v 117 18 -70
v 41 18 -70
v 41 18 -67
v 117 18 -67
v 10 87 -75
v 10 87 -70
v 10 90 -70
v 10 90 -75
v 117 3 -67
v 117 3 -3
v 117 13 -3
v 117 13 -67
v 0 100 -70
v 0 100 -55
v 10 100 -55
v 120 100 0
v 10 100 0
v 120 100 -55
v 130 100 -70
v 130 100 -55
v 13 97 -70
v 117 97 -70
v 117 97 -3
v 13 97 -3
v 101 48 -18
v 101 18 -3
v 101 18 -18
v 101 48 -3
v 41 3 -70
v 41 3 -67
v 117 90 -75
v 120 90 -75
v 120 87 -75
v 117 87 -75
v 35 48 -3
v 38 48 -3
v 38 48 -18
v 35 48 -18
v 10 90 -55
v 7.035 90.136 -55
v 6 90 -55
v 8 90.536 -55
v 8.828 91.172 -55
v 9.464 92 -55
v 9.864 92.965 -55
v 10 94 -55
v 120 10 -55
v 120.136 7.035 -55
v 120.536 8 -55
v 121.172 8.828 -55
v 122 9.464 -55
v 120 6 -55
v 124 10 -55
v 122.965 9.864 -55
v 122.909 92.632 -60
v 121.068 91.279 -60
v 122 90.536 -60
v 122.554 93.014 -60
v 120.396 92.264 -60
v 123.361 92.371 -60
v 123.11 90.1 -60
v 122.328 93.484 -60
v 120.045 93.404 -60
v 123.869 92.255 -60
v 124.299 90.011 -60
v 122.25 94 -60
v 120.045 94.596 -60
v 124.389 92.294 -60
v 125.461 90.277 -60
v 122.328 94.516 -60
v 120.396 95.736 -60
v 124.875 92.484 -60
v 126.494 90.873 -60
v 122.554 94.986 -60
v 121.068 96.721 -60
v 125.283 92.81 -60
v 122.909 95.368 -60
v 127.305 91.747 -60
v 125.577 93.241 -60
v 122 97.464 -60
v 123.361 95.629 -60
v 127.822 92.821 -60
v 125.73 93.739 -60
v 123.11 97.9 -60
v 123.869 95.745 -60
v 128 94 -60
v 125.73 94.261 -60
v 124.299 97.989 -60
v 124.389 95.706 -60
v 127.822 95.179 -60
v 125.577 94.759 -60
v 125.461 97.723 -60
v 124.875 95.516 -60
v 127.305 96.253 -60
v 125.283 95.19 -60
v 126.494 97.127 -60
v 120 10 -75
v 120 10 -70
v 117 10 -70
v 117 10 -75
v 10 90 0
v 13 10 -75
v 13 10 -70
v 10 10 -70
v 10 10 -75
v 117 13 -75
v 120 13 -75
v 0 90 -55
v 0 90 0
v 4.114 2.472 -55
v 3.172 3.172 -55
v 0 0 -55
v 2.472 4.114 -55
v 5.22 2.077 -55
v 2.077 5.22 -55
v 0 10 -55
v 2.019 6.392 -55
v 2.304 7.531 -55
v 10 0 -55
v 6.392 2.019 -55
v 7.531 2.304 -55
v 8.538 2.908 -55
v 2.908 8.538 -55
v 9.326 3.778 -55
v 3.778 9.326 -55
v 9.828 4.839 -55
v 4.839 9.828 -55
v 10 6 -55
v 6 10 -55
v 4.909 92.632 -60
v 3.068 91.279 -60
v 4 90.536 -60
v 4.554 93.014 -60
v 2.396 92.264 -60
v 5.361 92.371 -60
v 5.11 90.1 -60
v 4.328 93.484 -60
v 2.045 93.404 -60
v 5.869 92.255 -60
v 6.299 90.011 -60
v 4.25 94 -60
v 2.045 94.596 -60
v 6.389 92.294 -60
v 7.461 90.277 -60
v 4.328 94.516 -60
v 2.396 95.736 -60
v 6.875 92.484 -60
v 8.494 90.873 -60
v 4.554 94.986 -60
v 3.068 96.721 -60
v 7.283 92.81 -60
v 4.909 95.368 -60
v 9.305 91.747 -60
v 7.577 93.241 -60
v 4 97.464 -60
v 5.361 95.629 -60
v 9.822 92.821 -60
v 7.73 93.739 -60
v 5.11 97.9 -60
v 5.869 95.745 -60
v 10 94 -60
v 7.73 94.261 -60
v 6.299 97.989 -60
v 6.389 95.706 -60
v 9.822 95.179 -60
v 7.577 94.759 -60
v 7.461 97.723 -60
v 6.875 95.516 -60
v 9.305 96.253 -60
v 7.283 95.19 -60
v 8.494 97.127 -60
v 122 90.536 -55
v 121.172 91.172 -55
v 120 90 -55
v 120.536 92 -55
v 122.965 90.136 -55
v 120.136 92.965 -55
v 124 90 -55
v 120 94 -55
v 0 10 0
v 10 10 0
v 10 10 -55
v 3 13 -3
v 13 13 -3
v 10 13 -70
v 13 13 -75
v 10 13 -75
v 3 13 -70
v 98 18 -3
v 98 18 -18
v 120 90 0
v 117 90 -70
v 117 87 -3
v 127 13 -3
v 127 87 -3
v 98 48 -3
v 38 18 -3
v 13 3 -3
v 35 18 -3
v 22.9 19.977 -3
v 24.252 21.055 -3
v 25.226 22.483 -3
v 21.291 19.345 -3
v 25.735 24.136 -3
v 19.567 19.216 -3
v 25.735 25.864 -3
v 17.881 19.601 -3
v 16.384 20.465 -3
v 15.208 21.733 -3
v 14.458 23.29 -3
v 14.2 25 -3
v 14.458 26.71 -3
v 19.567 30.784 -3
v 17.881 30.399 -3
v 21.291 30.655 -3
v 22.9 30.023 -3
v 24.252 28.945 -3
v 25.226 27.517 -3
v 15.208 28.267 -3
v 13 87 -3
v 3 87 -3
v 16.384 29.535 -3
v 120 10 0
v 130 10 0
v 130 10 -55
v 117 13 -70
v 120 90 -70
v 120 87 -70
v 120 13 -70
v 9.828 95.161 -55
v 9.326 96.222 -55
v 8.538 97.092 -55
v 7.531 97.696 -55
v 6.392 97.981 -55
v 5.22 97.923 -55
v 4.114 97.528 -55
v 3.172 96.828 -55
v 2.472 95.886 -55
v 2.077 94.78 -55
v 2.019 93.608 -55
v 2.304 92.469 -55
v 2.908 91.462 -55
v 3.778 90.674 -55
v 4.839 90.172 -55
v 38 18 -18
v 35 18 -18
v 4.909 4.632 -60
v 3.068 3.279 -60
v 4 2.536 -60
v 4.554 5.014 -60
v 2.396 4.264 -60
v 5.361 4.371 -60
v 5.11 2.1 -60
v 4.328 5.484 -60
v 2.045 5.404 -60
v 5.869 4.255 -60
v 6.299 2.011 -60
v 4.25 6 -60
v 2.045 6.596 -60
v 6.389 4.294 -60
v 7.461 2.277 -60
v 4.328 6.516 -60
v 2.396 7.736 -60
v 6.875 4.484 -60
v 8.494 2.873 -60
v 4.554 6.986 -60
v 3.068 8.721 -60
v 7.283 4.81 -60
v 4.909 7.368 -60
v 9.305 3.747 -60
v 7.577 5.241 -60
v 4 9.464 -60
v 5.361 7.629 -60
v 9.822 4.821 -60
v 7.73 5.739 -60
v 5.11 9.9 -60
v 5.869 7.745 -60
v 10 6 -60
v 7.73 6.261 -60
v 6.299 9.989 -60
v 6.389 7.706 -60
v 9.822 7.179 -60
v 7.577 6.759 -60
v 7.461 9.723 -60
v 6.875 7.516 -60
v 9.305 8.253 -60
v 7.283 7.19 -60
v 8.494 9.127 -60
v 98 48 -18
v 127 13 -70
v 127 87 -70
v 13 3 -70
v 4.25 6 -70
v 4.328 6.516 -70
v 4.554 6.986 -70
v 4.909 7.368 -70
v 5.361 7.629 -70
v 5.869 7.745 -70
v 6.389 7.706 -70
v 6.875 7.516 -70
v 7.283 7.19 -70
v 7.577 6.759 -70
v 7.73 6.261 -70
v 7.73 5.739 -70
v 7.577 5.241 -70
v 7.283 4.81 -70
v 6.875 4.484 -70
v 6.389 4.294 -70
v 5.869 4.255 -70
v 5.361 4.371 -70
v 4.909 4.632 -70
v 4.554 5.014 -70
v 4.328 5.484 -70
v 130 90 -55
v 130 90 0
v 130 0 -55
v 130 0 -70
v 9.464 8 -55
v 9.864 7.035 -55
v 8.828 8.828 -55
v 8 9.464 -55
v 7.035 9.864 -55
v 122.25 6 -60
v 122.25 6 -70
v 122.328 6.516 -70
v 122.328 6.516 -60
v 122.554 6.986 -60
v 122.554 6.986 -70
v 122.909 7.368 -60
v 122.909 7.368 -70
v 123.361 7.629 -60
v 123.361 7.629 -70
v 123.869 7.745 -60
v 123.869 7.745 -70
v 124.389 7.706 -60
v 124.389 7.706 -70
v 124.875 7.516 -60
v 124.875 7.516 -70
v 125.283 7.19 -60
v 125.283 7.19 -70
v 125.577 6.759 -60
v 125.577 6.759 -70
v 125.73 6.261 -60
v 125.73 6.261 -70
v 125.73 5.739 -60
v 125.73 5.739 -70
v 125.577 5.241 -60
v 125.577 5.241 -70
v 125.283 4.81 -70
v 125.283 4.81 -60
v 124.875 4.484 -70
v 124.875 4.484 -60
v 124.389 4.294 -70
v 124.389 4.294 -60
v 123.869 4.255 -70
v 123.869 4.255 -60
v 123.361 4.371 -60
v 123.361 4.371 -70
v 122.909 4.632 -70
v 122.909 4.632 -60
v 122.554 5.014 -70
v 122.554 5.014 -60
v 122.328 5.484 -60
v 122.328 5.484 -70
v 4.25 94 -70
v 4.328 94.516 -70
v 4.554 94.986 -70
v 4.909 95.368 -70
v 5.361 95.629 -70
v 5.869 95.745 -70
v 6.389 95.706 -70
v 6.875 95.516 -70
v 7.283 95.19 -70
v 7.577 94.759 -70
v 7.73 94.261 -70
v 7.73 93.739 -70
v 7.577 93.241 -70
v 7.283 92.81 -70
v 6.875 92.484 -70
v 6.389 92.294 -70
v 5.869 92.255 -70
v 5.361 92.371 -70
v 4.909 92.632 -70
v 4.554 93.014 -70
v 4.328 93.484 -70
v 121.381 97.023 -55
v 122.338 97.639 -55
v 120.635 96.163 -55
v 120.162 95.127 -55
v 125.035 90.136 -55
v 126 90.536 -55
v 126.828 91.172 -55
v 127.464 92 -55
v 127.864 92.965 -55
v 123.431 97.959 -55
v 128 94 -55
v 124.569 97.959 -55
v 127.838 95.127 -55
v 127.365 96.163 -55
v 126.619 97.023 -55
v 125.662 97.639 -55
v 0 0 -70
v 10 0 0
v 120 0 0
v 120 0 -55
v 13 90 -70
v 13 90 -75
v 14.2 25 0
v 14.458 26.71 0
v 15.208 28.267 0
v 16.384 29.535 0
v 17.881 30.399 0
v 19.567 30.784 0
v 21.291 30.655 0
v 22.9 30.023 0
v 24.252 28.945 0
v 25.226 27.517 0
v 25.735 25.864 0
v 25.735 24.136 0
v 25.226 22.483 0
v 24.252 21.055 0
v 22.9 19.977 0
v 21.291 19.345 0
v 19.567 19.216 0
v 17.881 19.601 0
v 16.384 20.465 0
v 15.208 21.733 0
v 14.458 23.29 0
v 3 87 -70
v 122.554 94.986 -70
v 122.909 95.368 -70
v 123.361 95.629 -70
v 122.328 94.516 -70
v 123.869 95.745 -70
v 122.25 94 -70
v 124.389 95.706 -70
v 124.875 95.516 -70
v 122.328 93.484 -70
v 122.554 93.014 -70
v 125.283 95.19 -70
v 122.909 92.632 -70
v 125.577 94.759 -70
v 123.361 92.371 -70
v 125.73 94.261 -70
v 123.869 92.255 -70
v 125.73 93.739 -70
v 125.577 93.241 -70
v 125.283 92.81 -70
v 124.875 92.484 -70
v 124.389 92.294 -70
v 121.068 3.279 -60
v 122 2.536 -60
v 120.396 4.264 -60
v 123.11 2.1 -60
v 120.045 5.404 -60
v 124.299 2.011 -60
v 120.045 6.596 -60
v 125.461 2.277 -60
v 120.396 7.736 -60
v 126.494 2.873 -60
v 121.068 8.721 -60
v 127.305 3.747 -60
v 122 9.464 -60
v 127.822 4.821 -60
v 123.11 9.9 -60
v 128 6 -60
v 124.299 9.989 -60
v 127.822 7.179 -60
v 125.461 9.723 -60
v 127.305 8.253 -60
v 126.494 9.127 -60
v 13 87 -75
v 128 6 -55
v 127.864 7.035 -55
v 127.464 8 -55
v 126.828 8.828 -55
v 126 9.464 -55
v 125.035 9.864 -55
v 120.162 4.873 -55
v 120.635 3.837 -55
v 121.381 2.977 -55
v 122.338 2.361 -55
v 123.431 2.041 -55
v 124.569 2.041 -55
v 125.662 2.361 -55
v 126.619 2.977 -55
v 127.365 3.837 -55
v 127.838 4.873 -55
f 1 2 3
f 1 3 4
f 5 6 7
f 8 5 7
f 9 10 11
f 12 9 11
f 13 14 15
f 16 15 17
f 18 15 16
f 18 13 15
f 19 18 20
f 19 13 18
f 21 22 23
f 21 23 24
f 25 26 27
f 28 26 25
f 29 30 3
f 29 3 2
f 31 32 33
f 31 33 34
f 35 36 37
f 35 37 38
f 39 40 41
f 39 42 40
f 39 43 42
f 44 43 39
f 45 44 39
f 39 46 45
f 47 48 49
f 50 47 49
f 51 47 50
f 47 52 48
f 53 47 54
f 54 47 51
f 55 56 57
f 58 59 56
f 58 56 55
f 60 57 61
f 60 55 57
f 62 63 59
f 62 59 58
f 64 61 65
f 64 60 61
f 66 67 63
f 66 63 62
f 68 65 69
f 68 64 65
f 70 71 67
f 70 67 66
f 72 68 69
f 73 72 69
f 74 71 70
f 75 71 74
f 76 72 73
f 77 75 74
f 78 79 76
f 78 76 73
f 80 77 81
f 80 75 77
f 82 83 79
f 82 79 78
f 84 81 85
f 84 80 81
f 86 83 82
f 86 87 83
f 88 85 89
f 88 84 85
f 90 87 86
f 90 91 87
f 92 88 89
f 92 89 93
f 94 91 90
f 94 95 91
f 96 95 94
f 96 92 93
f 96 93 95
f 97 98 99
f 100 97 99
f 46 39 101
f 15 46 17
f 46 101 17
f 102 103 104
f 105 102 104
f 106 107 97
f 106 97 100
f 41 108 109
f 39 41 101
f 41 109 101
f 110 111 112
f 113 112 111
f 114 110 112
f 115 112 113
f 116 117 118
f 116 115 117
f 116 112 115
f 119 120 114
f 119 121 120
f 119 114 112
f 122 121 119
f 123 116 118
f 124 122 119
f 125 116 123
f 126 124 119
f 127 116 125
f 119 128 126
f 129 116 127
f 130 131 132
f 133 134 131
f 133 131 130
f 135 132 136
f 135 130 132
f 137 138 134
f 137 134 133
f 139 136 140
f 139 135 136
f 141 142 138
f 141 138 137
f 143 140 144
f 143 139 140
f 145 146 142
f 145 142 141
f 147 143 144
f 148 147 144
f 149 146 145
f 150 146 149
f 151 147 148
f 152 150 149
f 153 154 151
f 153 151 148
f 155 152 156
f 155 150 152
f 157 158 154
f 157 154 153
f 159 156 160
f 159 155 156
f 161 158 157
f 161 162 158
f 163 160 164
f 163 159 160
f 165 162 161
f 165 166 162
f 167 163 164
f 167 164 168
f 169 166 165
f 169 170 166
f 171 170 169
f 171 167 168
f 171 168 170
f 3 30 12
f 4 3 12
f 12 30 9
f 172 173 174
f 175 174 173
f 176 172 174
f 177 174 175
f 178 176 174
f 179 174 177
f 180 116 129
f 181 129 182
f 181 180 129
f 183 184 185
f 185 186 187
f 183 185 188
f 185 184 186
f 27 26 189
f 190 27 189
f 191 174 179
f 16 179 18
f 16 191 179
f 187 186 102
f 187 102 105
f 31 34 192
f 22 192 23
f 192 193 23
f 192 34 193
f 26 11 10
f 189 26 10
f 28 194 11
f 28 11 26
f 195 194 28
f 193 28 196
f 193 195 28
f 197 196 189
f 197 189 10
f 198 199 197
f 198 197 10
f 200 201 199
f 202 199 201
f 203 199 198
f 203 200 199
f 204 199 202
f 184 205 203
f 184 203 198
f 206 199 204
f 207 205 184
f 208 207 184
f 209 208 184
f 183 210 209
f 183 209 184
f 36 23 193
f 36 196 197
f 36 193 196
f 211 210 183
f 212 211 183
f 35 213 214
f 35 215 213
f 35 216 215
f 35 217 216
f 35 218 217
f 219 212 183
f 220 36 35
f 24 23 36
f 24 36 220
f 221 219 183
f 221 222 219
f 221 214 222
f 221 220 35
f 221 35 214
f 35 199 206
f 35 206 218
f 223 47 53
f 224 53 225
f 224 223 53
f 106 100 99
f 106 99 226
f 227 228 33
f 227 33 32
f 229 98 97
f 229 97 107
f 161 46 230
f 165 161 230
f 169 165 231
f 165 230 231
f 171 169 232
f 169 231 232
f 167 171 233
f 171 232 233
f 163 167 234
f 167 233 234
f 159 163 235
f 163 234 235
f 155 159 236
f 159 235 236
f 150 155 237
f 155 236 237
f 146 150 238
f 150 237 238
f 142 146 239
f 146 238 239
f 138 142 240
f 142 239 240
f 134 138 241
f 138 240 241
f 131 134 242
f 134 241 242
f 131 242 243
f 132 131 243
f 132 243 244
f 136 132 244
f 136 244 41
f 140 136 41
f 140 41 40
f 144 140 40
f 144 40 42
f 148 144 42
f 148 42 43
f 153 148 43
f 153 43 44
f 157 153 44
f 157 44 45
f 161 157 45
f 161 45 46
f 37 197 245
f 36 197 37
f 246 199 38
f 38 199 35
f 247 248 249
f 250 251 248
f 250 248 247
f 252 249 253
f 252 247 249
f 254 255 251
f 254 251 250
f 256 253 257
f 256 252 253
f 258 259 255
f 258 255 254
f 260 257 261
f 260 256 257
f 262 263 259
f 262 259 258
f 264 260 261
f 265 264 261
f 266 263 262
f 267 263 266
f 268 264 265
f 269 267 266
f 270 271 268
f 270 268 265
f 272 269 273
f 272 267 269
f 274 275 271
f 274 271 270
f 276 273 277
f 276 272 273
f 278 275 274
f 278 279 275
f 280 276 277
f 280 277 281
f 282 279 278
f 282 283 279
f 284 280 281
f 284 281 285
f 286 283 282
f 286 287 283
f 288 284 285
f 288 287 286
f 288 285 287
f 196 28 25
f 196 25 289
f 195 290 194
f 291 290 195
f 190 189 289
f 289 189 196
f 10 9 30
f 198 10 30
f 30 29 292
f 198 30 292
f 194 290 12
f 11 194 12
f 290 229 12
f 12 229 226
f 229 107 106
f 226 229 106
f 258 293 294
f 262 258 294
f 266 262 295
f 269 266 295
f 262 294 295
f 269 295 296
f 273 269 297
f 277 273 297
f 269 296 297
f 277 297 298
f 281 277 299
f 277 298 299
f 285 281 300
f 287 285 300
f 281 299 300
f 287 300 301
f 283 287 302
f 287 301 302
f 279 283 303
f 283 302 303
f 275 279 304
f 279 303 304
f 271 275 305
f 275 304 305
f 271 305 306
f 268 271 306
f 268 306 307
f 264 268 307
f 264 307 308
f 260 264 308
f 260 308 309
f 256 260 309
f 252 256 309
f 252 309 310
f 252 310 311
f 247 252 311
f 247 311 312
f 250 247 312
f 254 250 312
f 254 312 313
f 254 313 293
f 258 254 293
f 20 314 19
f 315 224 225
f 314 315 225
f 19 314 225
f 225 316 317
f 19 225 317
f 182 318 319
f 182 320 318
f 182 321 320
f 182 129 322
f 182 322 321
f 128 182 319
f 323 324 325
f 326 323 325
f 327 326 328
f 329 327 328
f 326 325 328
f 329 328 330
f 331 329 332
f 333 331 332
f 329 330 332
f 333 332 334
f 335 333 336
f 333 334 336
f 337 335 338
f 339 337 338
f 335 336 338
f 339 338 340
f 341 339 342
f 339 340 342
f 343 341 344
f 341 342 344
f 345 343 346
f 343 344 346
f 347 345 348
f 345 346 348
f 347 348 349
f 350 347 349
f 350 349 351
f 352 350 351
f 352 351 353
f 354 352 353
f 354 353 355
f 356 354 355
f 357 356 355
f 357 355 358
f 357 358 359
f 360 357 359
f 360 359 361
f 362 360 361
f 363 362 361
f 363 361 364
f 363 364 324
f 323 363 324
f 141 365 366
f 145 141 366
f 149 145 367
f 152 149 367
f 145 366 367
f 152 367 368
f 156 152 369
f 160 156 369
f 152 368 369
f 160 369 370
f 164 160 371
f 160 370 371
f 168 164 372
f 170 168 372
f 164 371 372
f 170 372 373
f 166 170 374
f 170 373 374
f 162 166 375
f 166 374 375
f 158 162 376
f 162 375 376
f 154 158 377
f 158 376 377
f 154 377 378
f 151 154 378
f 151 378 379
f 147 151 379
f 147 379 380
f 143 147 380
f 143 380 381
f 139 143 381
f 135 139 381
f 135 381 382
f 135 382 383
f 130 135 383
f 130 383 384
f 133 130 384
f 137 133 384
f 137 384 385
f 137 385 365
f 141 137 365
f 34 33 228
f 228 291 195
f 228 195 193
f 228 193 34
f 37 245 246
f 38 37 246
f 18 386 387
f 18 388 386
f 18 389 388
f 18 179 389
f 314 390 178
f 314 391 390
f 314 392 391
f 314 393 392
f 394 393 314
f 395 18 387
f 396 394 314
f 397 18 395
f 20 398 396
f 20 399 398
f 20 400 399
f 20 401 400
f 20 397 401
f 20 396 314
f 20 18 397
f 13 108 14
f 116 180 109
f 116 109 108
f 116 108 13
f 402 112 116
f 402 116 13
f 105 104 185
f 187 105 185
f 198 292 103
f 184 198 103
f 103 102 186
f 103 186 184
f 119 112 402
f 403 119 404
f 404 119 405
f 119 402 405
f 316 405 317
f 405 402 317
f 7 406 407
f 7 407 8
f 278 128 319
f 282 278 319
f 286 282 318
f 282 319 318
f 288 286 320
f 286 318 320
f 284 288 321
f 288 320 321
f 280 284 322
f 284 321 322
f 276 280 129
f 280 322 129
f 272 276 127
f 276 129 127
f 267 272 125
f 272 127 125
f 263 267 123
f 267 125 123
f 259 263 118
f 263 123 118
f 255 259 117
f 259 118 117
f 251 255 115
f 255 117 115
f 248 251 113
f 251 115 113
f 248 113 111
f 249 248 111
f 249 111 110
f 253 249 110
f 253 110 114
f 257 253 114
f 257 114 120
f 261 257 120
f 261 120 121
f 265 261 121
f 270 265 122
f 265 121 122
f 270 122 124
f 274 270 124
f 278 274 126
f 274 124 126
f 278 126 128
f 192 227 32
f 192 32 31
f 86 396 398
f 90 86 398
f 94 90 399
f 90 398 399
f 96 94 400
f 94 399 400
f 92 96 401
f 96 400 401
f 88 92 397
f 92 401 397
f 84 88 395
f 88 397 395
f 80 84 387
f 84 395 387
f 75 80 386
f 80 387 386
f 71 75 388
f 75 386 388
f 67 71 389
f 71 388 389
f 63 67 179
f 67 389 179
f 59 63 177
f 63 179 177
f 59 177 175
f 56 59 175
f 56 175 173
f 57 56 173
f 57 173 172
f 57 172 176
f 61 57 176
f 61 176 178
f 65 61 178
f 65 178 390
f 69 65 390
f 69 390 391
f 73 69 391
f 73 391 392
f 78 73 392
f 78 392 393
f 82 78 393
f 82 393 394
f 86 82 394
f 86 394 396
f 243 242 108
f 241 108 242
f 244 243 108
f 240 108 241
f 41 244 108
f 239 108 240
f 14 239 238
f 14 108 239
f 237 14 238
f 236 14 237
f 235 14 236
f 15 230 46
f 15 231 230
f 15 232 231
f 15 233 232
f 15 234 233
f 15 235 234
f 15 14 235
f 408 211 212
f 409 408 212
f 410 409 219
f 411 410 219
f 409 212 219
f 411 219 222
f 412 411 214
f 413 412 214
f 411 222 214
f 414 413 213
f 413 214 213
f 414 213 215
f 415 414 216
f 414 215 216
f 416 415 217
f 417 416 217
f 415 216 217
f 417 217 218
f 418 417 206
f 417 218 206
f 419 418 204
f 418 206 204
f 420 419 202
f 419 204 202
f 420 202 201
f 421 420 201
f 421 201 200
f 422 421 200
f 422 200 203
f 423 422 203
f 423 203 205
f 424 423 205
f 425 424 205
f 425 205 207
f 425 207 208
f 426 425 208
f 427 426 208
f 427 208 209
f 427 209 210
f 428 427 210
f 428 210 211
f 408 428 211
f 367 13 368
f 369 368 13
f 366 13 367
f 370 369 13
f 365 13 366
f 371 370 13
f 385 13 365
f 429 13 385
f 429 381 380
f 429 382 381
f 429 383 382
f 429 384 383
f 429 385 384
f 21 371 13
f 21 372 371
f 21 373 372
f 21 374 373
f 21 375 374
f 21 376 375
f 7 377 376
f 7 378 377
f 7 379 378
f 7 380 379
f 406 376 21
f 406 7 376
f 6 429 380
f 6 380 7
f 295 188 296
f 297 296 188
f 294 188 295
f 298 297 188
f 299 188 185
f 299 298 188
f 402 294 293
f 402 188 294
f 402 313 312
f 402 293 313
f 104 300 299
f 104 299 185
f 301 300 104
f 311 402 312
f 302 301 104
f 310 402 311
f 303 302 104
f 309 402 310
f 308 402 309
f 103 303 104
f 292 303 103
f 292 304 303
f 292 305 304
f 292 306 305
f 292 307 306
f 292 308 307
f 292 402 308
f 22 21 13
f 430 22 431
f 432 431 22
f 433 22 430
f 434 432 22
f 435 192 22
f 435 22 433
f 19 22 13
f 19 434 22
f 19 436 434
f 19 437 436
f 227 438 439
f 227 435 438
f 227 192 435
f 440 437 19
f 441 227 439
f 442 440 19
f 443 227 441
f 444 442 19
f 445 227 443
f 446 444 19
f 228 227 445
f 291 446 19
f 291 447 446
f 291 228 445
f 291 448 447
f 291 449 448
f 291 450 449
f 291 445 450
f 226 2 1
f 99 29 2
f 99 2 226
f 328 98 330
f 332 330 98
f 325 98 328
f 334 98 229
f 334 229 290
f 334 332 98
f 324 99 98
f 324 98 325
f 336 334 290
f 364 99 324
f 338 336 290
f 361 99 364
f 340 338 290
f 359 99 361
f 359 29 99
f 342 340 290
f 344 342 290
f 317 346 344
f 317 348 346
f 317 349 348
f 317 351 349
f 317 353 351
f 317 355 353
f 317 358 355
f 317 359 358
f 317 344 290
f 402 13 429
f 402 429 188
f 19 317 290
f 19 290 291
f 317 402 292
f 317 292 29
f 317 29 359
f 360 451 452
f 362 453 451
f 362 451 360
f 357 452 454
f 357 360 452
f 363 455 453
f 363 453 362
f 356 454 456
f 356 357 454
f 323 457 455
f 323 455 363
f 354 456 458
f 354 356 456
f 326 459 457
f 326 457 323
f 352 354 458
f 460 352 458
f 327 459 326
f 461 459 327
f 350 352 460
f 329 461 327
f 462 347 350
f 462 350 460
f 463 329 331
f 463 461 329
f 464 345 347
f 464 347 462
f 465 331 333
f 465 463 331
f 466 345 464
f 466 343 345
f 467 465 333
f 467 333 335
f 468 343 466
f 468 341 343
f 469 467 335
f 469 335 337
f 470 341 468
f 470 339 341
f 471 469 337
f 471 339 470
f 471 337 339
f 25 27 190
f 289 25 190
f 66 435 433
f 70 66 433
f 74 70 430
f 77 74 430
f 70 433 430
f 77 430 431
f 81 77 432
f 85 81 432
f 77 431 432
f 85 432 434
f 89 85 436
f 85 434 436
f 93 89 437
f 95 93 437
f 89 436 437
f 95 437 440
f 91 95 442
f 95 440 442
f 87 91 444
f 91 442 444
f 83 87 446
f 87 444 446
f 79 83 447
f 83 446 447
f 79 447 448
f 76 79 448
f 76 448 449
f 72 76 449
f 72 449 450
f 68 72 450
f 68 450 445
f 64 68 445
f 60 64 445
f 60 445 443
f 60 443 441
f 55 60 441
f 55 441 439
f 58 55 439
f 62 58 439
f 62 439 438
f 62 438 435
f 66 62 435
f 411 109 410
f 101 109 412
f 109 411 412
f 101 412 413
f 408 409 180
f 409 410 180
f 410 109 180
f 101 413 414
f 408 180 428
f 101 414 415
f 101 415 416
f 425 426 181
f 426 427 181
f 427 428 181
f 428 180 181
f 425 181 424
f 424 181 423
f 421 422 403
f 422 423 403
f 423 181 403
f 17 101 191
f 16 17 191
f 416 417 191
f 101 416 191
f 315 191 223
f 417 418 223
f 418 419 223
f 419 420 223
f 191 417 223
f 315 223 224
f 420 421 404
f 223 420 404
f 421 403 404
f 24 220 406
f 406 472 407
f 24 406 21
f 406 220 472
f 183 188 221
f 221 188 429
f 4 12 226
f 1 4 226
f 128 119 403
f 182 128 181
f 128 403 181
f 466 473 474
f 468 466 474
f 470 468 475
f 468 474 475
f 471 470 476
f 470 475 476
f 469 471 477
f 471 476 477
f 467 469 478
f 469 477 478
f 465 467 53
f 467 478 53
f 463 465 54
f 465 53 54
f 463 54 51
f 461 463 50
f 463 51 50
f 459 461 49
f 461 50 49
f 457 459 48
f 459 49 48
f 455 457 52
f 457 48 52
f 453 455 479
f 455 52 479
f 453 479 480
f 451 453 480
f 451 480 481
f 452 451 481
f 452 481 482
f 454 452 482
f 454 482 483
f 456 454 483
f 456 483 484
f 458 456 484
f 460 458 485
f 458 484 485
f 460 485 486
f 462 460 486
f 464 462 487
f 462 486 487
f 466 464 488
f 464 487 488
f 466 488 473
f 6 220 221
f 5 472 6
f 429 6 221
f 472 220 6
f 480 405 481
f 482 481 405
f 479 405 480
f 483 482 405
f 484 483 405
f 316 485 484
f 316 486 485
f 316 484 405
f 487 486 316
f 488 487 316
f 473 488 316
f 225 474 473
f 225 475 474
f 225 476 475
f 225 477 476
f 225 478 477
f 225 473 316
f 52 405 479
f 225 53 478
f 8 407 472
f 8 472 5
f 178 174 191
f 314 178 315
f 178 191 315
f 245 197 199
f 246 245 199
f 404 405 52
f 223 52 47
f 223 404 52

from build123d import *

# Parameters (mm, degrees)
SKETCH2_W           = 130
SKETCH2_H           = 70
BOSS_EXTRUDE1_DEPTH = 100
SKETCH3_W           = 104
SKETCH3_H           = 74
CUT_EXTRUDE1_DEPTH  = 67
SKETCH4_W           = 10
SKETCH4_H           = 10
CUT_EXTRUDE2_DEPTH  = 55
SKETCH5_W           = 104
SKETCH5_H           = 10
CUT_EXTRUDE3_DEPTH  = 67
SKETCH6_W           = 10
SKETCH6_H           = 74
CUT_EXTRUDE4_DEPTH  = 67
SKETCH9_R           = 1.75
CUT_EXTRUDE5_DEPTH  = 67
SKETCH10_R          = 4
CUT_EXTRUDE6_DEPTH  = 5
SKETCH12_R          = 4
CUT_EXTRUDE7_DEPTH  = 5
SKETCH13_R          = 4
CUT_EXTRUDE8_DEPTH  = 5
SKETCH14_R          = 4
CUT_EXTRUDE9_DEPTH  = 5
SKETCH15_W          = 3
SKETCH15_H          = 3
BOSS_EXTRUDE2_DEPTH = 5
SKETCH16_W          = 76
SKETCH16_H          = 3
BOSS_EXTRUDE3_DEPTH = 15
SKETCH17_W          = 3
SKETCH17_H          = 30
BOSS_EXTRUDE4_DEPTH = 15
SKETCH18_R          = 5.8
CUT_EXTRUDE10_DEPTH = 15


with BuildPart() as part:
    # Sketch2 → Boss-Extrude1 (new body)
    with BuildSketch(Plane(origin=(0, 0, 0), x_dir=(1, 0, 0), z_dir=(0, 1, 0))):
        with Locations((65, 35)):
            Rectangle(SKETCH2_W, SKETCH2_H)
    extrude(amount=BOSS_EXTRUDE1_DEPTH)

    # Sketch3 → Cut-Extrude1 (cut)
    with BuildSketch(Plane(origin=(0, 0, -70), x_dir=(-1, 0, 0), z_dir=(0, 0, -1))):
        with Locations((-65, 50)):
            Rectangle(SKETCH3_W, SKETCH3_H)
    extrude(amount=-CUT_EXTRUDE1_DEPTH, mode=Mode.SUBTRACT)

    # Sketch4 → Cut-Extrude2 (cut)
    with BuildSketch(Plane.XY):
        with Locations((5, 95)):
            Rectangle(SKETCH4_W, SKETCH4_H)
        with Locations((125, 95)):
            Rectangle(SKETCH4_W, SKETCH4_H)
        with Locations((5, 5)):
            Rectangle(SKETCH4_W, SKETCH4_H)
        with Locations((125, 5)):
            Rectangle(SKETCH4_W, SKETCH4_H)
    extrude(amount=-CUT_EXTRUDE2_DEPTH, mode=Mode.SUBTRACT)

    # Sketch5 → Cut-Extrude3 (cut)
    with BuildSketch(Plane(origin=(0, 0, -70), x_dir=(-1, 0, 0), z_dir=(0, 0, -1))):
        with Locations((-65, 92)):
            Rectangle(SKETCH5_W, SKETCH5_H)
        with Locations((-65, 8)):
            Rectangle(SKETCH5_W, SKETCH5_H)
    extrude(amount=-CUT_EXTRUDE3_DEPTH, mode=Mode.SUBTRACT)

    # Sketch6 → Cut-Extrude4 (cut)
    with BuildSketch(Plane(origin=(0, 0, -70), x_dir=(-1, 0, 0), z_dir=(0, 0, -1))):
        with Locations((-122, 50)):
            Rectangle(SKETCH6_W, SKETCH6_H)
        with Locations((-8, 50)):
            Rectangle(SKETCH6_W, SKETCH6_H)
    extrude(amount=-CUT_EXTRUDE4_DEPTH, mode=Mode.SUBTRACT)

    # Sketch9 → Cut-Extrude5 (cut)
    with BuildSketch(Plane(origin=(0, 0, -70), x_dir=(-1, 0, 0), z_dir=(0, 0, -1))):
        with Locations((-124, 94)):
            Circle(SKETCH9_R)
        with Locations((-124, 6)):
            Circle(SKETCH9_R)
        with Locations((-6, 94)):
            Circle(SKETCH9_R)
        with Locations((-6, 6)):
            Circle(SKETCH9_R)
    extrude(amount=-CUT_EXTRUDE5_DEPTH, mode=Mode.SUBTRACT)

    # Sketch10 → Cut-Extrude6 (cut)
    with BuildSketch(Plane.XY.offset(-55)):
        with Locations((124, 94)):
            Circle(SKETCH10_R)
    extrude(amount=-CUT_EXTRUDE6_DEPTH, mode=Mode.SUBTRACT)

    # Sketch12 → Cut-Extrude7 (cut)
    with BuildSketch(Plane.XY.offset(-55)):
        with Locations((124, 6)):
            Circle(SKETCH12_R)
    extrude(amount=-CUT_EXTRUDE7_DEPTH, mode=Mode.SUBTRACT)

    # Sketch13 → Cut-Extrude8 (cut)
    with BuildSketch(Plane.XY.offset(-55)):
        with Locations((6, 6)):
            Circle(SKETCH13_R)
    extrude(amount=-CUT_EXTRUDE8_DEPTH, mode=Mode.SUBTRACT)

    # Sketch14 → Cut-Extrude9 (cut)
    with BuildSketch(Plane.XY.offset(-55)):
        with Locations((6, 94)):
            Circle(SKETCH14_R)
    extrude(amount=-CUT_EXTRUDE9_DEPTH, mode=Mode.SUBTRACT)

    # Sketch15 → Boss-Extrude2 (add)
    with BuildSketch(Plane(origin=(0, 0, -70), x_dir=(-1, 0, 0), z_dir=(0, 0, -1))):
        with Locations((-118.5, 88.5)):
            Rectangle(SKETCH15_W, SKETCH15_H)
        with Locations((-118.5, 11.5)):
            Rectangle(SKETCH15_W, SKETCH15_H)
        with Locations((-11.5, 11.5)):
            Rectangle(SKETCH15_W, SKETCH15_H)
        with Locations((-11.5, 88.5)):
            Rectangle(SKETCH15_W, SKETCH15_H)
    extrude(amount=BOSS_EXTRUDE2_DEPTH)

    # Sketch16 → Boss-Extrude3 (add)
    with BuildSketch(Plane(origin=(0, 3, 0), x_dir=(1, 0, 0), z_dir=(0, 1, 0))):
        with Locations((79, 68.5)):
            Rectangle(SKETCH16_W, SKETCH16_H)
    extrude(amount=BOSS_EXTRUDE3_DEPTH)

    # Sketch17 → Boss-Extrude4 (add)
    with BuildSketch(Plane(origin=(0, 0, -3), x_dir=(-1, 0, 0), z_dir=(0, 0, -1))):
        with Locations((-99.5, 33)):
            Rectangle(SKETCH17_W, SKETCH17_H)
        with Locations((-36.5, 33)):
            Rectangle(SKETCH17_W, SKETCH17_H)
    extrude(amount=BOSS_EXTRUDE4_DEPTH)

    # Sketch18 → Cut-Extrude10 (cut)
    with BuildSketch(Plane(origin=(0, 0, -3), x_dir=(-1, 0, 0), z_dir=(0, 0, -1))):
        with Locations((-20, 25)):
            Circle(SKETCH18_R)
    extrude(amount=-CUT_EXTRUDE10_DEPTH, mode=Mode.SUBTRACT)


solid = part.part
